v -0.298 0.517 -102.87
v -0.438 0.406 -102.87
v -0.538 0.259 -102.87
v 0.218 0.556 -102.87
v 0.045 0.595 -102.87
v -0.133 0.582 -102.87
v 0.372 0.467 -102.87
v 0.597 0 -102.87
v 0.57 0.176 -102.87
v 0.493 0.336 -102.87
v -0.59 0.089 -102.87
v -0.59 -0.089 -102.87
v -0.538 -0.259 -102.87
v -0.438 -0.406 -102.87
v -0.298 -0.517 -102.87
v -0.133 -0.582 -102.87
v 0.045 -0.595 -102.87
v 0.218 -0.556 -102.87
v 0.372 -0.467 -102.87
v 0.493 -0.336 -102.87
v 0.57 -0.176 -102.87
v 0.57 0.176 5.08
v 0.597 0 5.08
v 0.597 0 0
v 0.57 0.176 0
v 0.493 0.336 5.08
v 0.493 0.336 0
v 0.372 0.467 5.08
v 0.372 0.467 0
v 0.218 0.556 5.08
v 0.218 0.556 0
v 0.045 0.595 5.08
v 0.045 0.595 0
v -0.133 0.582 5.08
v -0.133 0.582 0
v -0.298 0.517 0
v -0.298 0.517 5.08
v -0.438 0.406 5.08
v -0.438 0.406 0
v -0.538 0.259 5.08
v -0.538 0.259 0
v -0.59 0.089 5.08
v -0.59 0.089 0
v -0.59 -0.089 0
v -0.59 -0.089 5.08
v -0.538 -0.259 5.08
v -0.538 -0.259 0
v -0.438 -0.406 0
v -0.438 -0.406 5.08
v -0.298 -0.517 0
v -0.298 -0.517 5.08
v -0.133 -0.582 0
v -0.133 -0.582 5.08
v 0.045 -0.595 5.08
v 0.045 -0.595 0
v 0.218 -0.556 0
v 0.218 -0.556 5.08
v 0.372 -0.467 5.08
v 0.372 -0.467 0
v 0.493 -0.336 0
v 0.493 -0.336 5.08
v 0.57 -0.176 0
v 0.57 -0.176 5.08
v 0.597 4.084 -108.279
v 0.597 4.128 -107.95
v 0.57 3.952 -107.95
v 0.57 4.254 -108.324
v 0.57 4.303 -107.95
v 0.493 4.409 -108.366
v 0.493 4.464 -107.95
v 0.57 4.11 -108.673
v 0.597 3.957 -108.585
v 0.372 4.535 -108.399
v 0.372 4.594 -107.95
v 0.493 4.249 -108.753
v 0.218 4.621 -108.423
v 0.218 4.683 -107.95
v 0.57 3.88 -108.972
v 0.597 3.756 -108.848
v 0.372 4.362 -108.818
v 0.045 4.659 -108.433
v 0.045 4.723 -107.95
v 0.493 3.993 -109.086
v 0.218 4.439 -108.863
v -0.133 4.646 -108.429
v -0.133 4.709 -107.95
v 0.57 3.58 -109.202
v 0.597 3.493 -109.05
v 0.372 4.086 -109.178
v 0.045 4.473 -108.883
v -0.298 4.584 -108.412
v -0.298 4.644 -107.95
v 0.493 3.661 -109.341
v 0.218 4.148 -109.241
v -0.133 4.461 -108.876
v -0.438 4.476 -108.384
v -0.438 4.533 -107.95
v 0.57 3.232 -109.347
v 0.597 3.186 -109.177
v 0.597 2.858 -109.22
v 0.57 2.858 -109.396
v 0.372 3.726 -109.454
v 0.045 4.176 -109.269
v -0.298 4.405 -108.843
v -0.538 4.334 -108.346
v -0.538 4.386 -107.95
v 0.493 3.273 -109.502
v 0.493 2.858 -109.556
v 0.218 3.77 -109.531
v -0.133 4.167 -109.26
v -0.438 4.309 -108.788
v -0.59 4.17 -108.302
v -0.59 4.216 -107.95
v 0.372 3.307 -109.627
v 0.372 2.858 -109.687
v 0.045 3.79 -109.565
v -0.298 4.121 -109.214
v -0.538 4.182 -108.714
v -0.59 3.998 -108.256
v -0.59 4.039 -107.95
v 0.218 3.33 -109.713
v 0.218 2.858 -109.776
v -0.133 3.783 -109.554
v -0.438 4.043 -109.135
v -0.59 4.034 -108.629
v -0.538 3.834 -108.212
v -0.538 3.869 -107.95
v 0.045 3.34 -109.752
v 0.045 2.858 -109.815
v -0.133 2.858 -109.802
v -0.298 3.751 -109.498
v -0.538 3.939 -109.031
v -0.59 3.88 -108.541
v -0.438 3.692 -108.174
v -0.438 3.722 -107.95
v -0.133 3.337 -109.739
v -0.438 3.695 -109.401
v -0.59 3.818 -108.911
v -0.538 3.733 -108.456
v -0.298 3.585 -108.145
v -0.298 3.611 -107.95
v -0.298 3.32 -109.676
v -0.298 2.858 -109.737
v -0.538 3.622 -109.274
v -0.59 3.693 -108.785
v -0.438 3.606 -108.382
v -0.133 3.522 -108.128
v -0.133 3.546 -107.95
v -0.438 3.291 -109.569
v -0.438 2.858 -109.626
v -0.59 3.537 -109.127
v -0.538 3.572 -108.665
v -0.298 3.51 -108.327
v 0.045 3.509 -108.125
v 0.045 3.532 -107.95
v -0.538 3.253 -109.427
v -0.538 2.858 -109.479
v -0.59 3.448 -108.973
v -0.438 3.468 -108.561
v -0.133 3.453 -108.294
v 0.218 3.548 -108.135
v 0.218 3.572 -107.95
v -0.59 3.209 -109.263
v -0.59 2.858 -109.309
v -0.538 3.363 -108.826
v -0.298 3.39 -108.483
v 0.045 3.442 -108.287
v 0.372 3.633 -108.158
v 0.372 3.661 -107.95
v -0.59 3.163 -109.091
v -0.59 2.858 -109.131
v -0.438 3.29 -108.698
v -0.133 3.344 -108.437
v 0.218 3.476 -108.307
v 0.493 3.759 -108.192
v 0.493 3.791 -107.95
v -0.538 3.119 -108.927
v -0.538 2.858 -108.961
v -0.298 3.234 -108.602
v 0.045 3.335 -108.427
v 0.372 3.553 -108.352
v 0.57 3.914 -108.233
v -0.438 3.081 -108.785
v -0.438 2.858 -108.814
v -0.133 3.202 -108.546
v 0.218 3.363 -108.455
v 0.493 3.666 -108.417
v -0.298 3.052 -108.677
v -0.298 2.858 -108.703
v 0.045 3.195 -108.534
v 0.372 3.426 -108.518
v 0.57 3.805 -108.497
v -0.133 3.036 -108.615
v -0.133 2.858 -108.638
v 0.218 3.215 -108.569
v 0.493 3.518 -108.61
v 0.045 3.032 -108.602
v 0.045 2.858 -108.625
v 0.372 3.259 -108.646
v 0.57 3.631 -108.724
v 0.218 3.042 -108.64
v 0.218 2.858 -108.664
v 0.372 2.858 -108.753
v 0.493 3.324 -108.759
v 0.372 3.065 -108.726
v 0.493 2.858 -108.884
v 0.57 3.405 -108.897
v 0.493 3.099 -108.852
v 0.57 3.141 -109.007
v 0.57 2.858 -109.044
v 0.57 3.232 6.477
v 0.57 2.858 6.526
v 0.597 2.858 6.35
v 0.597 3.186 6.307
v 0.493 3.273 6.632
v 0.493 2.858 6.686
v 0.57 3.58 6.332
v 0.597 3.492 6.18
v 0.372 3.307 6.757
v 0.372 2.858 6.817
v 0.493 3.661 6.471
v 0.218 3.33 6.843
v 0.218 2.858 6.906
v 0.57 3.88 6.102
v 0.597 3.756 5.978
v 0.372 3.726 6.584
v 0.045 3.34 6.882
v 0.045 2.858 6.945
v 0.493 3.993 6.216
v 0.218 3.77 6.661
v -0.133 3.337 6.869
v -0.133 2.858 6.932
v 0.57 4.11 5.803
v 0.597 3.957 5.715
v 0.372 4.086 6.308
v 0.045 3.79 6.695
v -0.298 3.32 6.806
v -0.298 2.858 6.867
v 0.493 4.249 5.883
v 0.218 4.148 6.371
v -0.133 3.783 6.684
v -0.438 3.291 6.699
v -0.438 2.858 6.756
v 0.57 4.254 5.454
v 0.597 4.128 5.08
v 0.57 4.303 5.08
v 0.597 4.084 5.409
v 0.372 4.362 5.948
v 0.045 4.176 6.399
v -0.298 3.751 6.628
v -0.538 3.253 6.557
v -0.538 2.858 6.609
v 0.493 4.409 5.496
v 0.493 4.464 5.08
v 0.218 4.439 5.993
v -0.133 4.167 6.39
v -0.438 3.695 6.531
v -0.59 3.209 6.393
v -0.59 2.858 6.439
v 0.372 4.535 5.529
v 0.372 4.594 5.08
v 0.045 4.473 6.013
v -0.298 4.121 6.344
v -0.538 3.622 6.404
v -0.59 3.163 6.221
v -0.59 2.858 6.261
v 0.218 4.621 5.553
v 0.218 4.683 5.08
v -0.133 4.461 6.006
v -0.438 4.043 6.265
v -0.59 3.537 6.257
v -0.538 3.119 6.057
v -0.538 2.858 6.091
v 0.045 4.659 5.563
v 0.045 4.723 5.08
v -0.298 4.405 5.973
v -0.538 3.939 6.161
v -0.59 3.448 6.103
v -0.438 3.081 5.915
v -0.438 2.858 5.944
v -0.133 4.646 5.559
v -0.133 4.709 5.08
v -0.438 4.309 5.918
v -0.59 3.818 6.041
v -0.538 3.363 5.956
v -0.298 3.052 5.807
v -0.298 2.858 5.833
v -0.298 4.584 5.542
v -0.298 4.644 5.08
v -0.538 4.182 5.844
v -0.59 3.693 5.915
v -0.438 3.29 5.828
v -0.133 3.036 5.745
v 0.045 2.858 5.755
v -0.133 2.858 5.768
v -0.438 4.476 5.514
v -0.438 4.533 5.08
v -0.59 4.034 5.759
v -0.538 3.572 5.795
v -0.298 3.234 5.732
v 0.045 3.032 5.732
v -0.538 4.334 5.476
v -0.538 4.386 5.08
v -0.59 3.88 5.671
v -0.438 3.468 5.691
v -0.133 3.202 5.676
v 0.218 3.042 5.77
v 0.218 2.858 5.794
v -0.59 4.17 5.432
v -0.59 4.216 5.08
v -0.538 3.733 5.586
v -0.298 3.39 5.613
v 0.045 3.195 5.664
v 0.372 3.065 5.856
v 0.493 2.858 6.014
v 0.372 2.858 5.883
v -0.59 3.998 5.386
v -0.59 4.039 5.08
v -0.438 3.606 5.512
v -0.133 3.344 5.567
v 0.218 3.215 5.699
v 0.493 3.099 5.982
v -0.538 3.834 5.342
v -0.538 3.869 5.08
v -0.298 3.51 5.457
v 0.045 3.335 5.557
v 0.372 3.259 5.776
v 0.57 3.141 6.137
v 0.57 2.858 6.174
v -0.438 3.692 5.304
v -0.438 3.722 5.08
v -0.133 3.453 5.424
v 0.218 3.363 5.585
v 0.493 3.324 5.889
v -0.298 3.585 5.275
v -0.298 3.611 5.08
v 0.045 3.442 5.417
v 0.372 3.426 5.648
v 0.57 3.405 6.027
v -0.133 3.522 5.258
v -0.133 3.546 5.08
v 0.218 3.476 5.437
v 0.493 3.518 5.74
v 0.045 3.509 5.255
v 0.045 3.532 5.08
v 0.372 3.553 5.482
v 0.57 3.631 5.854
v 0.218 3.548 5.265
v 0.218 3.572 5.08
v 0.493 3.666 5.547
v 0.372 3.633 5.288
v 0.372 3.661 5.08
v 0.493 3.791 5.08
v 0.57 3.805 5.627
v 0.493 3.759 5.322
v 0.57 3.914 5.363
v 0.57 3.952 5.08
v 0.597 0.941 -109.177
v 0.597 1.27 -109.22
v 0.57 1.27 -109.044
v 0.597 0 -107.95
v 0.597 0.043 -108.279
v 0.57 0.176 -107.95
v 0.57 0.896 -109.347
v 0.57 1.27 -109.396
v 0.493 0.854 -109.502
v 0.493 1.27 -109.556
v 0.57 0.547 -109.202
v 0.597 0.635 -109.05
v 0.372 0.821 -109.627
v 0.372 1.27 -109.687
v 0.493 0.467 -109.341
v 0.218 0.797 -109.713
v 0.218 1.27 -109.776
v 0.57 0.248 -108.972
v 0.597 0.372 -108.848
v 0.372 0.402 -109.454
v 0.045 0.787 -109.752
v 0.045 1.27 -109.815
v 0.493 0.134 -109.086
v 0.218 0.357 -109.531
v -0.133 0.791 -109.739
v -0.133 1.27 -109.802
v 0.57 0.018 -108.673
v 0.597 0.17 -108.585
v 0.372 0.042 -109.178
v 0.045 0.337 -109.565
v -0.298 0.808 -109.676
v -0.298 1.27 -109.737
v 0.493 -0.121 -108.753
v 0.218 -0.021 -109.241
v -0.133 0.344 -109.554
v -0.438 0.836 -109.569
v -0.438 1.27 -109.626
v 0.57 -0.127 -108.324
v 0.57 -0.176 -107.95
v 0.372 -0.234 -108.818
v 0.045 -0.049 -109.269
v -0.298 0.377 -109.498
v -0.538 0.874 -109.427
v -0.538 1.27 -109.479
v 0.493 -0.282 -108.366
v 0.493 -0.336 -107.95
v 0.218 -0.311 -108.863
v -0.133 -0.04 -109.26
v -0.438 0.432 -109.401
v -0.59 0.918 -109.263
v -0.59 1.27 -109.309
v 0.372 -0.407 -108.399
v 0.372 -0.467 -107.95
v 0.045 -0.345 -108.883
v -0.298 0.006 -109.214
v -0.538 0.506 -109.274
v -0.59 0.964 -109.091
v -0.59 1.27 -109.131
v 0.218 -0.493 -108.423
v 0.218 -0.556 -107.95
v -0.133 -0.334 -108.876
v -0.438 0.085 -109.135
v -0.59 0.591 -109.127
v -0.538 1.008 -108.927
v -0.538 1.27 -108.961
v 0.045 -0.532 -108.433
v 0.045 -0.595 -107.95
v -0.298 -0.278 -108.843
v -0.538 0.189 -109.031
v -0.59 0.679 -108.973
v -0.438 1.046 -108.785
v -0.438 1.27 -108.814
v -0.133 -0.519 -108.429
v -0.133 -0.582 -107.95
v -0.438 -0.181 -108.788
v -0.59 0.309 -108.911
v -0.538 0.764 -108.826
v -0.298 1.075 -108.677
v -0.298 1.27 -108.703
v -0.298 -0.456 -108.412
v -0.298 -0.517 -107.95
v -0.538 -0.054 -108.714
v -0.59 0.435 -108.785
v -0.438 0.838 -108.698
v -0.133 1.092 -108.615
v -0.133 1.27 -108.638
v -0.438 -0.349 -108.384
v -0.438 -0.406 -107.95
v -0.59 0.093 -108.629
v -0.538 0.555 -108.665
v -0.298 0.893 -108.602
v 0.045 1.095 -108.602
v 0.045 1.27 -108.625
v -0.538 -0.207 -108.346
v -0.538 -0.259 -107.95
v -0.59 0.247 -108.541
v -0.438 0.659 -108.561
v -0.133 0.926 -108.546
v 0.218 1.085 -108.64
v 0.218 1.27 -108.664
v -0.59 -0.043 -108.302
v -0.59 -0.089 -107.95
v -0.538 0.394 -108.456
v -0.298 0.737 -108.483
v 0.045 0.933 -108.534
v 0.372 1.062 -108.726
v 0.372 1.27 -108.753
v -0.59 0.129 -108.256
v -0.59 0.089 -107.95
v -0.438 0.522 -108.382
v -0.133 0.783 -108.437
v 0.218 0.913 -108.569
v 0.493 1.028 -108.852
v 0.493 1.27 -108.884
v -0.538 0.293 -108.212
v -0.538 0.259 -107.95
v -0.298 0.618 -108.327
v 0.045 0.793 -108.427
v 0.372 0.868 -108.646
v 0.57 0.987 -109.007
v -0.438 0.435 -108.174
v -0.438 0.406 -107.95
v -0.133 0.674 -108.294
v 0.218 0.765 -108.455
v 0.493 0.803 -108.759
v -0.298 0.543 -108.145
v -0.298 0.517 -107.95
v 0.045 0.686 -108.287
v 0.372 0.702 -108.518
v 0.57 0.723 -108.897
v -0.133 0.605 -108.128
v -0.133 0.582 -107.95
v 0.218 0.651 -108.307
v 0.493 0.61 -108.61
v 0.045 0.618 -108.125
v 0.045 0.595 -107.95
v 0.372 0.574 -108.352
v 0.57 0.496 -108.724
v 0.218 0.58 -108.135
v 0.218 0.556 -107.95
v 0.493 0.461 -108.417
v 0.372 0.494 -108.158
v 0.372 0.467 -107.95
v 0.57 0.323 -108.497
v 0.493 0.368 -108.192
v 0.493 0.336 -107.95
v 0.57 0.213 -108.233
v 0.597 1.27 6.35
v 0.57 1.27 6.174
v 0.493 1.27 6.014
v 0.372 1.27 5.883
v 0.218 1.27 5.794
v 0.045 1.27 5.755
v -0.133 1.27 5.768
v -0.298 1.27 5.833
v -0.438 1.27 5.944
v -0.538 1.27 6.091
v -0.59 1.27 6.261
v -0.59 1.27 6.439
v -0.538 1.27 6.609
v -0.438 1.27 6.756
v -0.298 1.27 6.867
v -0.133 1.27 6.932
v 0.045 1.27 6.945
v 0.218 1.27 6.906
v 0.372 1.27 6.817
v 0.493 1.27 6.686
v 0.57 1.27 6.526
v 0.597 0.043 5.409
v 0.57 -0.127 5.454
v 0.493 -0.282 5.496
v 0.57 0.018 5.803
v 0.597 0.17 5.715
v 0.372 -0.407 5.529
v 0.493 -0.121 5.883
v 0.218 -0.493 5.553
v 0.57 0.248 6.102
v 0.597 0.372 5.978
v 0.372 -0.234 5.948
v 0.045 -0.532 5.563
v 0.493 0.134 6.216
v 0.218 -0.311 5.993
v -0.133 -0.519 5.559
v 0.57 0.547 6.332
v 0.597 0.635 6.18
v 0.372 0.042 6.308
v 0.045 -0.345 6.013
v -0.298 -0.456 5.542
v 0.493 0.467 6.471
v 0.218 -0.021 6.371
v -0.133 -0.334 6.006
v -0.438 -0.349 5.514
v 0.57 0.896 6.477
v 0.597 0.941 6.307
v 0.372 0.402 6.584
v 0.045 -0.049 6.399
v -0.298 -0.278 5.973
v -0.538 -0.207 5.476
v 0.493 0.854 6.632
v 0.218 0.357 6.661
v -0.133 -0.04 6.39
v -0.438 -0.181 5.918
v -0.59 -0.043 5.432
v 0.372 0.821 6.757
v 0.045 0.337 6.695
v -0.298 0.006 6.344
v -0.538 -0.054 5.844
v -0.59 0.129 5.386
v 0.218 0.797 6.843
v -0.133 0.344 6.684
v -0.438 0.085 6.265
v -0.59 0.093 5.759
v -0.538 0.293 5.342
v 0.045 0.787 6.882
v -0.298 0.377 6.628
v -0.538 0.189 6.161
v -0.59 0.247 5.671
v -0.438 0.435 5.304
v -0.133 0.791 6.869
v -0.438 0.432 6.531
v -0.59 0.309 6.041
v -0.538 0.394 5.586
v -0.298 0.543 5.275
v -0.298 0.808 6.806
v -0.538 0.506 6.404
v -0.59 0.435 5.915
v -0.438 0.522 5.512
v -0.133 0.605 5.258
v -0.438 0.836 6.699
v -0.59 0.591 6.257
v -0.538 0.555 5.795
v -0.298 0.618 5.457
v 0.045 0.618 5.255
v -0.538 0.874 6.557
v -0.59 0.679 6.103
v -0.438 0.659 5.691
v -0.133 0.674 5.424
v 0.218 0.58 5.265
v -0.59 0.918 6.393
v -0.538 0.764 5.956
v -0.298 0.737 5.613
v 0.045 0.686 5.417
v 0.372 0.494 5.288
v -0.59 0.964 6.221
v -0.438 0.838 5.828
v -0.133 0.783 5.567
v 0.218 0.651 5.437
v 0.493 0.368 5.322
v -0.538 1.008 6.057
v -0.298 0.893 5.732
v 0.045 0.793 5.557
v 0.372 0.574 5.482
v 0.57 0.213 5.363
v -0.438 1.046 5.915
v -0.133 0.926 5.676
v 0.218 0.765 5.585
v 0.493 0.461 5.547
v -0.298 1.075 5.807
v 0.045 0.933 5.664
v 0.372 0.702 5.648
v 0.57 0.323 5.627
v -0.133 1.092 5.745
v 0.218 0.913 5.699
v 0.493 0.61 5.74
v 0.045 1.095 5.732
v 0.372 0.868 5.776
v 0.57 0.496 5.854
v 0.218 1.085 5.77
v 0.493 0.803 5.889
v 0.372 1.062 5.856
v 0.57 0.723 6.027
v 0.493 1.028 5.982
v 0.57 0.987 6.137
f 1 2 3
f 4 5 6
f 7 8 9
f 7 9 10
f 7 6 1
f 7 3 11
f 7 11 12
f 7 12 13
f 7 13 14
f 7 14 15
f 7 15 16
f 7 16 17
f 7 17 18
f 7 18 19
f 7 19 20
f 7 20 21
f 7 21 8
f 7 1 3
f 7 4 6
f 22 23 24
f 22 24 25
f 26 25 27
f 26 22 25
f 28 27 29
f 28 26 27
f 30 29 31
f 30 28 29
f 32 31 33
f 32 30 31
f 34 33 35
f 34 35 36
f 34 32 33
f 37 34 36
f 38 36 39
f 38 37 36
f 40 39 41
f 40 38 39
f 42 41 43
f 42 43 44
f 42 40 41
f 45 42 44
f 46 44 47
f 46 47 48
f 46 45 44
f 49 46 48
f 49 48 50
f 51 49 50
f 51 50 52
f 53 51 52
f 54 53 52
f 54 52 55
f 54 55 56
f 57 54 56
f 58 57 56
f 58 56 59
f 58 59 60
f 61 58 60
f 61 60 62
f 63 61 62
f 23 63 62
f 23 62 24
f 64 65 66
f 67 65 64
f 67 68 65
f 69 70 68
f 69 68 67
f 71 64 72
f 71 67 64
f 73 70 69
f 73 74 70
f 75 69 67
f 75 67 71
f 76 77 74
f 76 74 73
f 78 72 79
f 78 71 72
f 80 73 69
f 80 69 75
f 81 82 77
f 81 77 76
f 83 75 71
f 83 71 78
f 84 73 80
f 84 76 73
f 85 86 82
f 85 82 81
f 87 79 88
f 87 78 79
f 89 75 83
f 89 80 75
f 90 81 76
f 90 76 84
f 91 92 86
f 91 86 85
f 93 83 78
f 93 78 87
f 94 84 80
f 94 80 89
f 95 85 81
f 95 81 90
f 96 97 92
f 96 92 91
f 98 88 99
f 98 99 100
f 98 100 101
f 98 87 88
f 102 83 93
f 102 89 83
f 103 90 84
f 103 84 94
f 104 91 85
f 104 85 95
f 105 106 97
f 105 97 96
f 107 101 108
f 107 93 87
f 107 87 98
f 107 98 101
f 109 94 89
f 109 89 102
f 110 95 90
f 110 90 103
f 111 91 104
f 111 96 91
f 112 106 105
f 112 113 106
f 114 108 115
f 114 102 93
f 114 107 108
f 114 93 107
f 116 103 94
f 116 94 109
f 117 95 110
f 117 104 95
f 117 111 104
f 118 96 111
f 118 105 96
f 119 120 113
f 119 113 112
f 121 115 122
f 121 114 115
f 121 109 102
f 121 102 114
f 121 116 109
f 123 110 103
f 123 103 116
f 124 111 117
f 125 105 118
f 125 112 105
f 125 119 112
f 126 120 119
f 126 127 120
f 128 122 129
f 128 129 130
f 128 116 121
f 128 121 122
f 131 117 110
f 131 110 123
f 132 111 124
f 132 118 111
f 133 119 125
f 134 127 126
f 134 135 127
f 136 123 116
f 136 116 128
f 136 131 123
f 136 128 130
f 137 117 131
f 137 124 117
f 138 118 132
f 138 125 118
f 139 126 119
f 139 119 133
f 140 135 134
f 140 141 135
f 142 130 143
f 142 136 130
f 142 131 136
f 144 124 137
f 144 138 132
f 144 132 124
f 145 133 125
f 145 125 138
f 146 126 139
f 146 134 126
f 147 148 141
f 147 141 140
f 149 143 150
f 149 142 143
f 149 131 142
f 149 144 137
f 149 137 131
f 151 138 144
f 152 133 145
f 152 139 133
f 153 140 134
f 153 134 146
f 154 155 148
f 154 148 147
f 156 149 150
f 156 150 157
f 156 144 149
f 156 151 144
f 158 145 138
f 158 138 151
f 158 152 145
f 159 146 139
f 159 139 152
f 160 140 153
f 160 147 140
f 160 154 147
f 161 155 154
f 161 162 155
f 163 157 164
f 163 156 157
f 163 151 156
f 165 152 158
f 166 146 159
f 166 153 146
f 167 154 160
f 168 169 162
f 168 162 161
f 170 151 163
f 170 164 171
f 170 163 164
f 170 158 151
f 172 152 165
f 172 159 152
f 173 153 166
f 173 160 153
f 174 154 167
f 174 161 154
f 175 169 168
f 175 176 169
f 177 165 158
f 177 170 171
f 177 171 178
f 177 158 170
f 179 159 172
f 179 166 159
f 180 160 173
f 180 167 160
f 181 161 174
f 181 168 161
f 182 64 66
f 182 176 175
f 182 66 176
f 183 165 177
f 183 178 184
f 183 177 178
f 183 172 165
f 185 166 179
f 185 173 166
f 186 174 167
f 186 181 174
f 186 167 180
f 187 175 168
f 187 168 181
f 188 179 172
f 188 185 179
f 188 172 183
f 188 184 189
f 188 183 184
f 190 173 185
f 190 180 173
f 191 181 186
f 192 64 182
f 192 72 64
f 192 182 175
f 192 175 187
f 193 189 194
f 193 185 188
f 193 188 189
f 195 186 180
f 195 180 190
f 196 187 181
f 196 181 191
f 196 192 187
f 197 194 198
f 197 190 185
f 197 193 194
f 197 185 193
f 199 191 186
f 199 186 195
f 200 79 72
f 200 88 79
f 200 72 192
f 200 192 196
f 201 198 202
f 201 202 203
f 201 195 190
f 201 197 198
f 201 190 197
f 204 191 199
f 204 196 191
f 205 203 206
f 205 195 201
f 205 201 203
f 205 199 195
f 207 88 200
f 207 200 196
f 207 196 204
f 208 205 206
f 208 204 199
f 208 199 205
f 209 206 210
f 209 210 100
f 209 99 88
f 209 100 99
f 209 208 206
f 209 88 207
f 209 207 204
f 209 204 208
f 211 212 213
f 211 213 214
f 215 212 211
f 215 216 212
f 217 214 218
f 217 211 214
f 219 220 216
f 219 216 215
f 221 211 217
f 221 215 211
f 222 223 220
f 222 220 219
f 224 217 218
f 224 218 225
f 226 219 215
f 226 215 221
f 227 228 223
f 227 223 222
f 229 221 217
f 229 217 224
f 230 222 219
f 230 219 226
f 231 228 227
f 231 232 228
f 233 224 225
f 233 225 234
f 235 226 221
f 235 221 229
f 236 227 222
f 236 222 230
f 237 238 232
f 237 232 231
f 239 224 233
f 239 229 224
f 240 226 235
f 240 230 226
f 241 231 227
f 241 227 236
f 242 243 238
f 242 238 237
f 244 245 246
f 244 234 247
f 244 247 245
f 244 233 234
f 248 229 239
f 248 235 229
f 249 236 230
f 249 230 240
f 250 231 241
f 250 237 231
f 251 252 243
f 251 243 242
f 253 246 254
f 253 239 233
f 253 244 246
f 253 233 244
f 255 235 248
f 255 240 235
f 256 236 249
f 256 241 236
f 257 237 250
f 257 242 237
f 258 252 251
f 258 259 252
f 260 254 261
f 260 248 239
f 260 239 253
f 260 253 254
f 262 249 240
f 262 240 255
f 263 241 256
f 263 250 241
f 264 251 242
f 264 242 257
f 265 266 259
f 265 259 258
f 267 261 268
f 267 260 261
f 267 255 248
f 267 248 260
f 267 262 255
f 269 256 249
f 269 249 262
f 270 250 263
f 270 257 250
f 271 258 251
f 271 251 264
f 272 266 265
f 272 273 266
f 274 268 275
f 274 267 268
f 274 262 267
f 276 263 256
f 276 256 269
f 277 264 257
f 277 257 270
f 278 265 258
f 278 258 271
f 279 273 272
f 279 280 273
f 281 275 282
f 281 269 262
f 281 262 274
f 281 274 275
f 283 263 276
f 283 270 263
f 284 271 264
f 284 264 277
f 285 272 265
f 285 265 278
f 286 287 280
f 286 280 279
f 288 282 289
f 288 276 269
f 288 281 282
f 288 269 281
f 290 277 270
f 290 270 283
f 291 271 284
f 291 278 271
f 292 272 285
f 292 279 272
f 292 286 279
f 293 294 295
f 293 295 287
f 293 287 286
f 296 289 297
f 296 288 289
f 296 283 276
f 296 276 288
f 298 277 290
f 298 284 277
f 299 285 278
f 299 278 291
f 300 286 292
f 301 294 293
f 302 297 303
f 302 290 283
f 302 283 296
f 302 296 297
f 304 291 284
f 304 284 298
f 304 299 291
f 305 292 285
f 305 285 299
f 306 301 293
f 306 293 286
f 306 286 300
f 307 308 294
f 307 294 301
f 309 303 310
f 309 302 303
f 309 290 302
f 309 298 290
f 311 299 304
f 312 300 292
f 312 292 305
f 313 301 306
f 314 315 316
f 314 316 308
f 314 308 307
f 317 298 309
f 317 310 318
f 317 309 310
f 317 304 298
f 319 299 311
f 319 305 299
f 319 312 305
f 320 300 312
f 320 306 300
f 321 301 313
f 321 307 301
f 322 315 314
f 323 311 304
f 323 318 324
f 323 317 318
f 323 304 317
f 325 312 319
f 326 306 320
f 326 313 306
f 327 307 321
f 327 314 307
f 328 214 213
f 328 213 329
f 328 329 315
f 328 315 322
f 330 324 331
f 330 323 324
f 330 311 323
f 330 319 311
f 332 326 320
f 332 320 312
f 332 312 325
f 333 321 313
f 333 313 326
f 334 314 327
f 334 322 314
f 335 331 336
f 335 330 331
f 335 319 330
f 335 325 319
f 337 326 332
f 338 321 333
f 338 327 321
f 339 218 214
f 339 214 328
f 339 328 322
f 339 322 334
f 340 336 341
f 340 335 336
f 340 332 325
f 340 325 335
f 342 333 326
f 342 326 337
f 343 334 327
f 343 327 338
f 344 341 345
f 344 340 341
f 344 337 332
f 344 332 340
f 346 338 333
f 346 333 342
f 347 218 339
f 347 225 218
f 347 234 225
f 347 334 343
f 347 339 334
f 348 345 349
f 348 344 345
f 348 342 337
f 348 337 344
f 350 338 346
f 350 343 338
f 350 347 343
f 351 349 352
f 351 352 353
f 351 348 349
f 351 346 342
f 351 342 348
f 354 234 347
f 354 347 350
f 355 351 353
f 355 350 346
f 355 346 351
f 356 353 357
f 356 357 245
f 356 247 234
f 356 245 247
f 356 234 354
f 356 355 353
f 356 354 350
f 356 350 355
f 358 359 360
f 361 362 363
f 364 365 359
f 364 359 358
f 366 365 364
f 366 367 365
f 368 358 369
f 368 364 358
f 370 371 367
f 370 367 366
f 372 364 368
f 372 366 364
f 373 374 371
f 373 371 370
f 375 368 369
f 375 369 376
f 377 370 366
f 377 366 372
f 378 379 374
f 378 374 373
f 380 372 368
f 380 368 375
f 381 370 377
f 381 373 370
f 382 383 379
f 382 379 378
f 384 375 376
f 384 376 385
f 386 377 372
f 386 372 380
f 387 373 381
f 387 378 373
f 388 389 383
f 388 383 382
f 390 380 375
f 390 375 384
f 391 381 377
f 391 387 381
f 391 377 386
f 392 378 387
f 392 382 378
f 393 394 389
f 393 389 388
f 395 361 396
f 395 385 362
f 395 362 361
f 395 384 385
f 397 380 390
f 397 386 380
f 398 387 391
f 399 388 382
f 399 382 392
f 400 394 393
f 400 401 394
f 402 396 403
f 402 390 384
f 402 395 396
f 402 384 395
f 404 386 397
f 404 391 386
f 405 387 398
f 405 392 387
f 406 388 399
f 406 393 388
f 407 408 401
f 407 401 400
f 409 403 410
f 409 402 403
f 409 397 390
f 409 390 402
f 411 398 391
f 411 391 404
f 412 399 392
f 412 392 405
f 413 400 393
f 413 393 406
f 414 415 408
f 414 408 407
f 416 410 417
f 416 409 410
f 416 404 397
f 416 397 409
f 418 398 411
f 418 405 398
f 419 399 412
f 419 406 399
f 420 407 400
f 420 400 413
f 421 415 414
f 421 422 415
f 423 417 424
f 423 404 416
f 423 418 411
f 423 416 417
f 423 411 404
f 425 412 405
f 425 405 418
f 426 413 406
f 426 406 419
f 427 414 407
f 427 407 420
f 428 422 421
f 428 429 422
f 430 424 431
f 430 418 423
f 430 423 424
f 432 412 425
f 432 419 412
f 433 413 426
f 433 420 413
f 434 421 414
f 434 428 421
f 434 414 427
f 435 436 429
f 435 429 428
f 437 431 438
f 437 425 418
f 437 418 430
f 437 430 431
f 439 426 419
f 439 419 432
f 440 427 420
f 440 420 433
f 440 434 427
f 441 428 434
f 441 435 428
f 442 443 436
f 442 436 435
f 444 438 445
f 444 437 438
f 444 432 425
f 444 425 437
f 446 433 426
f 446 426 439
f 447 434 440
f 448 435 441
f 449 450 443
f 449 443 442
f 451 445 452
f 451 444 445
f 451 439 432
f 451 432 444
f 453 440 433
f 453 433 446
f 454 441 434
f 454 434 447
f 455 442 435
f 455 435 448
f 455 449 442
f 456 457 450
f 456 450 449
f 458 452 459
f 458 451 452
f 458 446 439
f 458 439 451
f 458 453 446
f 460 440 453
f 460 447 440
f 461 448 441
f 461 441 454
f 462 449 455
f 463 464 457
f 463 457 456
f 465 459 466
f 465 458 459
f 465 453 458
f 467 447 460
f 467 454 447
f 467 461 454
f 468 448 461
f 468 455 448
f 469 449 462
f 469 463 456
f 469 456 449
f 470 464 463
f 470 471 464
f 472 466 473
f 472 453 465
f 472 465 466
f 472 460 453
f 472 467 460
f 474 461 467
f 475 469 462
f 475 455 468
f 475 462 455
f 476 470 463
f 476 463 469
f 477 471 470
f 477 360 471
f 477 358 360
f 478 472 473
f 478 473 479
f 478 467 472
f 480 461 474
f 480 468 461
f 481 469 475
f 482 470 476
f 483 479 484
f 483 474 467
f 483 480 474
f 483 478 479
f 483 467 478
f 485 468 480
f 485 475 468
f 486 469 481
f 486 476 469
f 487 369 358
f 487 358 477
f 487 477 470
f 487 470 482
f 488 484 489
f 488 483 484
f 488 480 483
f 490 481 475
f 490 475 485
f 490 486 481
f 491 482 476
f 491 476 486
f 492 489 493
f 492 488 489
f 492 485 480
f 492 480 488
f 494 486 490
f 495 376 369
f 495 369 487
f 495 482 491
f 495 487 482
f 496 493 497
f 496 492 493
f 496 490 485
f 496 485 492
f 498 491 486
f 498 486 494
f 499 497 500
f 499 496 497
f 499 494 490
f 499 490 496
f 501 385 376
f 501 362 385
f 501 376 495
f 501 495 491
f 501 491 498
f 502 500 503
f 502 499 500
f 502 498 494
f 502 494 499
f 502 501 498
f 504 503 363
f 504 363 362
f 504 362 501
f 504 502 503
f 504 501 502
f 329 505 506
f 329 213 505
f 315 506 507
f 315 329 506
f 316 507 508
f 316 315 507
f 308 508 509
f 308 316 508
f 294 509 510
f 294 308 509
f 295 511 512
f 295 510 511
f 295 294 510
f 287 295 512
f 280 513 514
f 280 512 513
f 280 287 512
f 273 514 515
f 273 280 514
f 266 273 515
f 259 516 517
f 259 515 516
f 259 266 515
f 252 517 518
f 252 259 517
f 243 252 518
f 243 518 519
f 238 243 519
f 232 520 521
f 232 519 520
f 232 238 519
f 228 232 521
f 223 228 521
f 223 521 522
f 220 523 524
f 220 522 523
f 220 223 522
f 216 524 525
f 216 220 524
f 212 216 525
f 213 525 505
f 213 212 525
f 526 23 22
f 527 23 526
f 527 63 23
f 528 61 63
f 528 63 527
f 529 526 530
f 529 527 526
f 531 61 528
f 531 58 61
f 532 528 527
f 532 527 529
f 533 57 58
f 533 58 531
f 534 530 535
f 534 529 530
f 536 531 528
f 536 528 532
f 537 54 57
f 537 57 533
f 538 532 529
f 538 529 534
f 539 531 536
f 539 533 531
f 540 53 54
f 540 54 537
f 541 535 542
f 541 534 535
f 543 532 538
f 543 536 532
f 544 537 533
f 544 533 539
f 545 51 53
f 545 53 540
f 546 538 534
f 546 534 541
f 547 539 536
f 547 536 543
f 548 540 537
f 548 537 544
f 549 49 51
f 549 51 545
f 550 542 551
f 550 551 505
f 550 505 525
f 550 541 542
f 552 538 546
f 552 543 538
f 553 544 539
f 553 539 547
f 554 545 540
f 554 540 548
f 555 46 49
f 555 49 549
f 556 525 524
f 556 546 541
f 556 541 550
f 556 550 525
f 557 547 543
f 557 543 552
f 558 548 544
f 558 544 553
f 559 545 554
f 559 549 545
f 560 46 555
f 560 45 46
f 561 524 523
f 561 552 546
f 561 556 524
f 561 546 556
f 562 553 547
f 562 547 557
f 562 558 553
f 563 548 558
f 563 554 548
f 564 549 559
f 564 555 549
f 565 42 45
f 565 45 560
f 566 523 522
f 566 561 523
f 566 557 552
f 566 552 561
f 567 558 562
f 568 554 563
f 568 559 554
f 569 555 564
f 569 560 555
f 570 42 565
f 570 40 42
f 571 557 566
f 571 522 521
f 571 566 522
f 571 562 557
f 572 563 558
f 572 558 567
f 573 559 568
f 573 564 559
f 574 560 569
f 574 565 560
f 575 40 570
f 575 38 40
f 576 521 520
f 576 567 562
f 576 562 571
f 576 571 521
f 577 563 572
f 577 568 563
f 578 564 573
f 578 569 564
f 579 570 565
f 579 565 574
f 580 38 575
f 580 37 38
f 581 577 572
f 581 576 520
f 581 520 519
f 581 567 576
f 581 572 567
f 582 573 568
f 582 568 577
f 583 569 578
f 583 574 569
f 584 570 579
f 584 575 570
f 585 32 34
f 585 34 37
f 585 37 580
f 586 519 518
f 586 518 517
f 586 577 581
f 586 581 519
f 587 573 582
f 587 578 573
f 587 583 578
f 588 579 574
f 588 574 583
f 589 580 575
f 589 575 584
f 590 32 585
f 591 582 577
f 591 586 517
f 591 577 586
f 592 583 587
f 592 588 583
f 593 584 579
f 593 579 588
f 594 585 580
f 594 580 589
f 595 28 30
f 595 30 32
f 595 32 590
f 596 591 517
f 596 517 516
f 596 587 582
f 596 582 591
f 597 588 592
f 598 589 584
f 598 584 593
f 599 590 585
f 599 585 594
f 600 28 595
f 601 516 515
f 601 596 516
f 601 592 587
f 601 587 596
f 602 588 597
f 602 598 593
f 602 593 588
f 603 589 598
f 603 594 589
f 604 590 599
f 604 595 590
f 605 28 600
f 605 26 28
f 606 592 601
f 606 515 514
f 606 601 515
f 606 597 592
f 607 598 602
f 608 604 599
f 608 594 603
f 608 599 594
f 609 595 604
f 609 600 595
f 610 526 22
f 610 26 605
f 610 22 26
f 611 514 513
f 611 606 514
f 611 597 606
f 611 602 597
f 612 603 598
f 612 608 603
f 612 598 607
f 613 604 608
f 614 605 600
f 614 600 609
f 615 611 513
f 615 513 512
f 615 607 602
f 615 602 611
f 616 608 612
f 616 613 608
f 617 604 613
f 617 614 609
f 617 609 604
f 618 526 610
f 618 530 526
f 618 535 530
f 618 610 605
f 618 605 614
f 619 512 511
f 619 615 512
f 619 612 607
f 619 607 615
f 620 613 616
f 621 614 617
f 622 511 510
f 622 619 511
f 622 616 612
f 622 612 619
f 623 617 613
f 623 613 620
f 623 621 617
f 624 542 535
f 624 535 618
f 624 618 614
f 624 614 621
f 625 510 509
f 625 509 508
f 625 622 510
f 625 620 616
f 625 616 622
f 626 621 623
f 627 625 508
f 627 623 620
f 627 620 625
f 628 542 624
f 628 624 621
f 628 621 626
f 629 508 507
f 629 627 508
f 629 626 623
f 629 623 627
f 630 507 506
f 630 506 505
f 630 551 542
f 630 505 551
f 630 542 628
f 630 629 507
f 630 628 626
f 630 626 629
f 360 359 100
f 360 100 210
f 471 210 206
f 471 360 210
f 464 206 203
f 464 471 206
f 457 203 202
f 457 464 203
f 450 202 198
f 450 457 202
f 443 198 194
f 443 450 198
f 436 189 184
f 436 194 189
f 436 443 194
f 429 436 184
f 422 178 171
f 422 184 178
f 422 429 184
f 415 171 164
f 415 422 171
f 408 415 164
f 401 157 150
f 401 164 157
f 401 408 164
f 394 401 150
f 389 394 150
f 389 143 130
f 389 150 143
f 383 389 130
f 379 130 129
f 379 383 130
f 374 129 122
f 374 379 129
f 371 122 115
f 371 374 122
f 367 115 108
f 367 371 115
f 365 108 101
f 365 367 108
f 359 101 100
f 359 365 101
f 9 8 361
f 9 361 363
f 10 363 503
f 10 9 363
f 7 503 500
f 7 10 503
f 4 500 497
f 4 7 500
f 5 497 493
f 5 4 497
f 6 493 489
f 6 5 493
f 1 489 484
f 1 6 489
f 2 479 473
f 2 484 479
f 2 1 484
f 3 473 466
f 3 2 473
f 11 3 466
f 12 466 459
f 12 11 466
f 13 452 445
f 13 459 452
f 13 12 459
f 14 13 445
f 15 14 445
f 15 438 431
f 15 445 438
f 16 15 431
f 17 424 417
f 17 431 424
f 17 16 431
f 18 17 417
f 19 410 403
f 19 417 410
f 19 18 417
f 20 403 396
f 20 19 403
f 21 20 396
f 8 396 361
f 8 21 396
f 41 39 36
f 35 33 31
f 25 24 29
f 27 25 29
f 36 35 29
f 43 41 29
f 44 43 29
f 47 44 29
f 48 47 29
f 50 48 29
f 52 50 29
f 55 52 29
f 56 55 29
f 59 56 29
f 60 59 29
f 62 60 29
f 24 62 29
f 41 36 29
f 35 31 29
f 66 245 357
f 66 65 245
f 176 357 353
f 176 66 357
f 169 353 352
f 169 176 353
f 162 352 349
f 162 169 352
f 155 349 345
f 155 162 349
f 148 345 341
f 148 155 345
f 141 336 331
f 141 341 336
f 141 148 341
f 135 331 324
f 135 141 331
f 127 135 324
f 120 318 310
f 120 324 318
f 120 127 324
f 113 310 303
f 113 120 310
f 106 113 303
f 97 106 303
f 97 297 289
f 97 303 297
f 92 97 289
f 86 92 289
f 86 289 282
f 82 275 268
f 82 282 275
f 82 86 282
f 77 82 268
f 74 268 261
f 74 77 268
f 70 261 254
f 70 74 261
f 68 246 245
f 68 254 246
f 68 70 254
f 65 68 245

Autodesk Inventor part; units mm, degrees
ref_plane "YZ Plane" through (0, 0, 0) normal (1, 0, 0) x (0, 1, 0)
ref_plane "XZ Plane" through (0, 0, 0) normal (0, 1, 0) x (-1, 0, 0)
ref_plane "XY Plane" through (0, 0, 0) normal (0, 0, 1) x (1, 0, 0)
sketch "Sketch1" plane through (0, 0, 0) normal (0, 0, 1) x (1, 0, 0)
  circle A0 centre (0, 0) radius 0.5969
  dimension "d0" = 1.1938
sketch "Sketch2" plane through (0, 0, 0) normal (1, 0, 0) x (0, 1, 0)
  line L0 (0, 0) -> (0, 5.08)
  line L1 (1.27, 6.35) -> (2.8575, 6.35)
  line L2 (4.1275, 5.08) -> (4.1275, -107.95)
  line L3 (0, -107.95) -> (0, -102.87)
  line L4 (2.8575, -109.22) -> (1.27, -109.22)
  arc A0 (4.1275, 5.08) -> (2.8575, 6.35) centre (2.8575, 5.08) ccw
  arc A1 (2.8575, -109.22) -> (4.1275, -107.95) centre (2.8575, -107.95) ccw
  arc A2 (0, -107.95) -> (1.27, -109.22) centre (1.27, -107.95) ccw
  arc A3 (1.27, 6.35) -> (0, 5.08) centre (1.27, 5.08) ccw
  dimension "d1" = 1.27
  dimension "d5" = 1.5875
  dimension "d7" = 115.57
  dimension "d8" = 6.35
sweep "Sweep1" add profiles "Sketch1" path "Sketch2"
properties part number "Rudder_Link"
